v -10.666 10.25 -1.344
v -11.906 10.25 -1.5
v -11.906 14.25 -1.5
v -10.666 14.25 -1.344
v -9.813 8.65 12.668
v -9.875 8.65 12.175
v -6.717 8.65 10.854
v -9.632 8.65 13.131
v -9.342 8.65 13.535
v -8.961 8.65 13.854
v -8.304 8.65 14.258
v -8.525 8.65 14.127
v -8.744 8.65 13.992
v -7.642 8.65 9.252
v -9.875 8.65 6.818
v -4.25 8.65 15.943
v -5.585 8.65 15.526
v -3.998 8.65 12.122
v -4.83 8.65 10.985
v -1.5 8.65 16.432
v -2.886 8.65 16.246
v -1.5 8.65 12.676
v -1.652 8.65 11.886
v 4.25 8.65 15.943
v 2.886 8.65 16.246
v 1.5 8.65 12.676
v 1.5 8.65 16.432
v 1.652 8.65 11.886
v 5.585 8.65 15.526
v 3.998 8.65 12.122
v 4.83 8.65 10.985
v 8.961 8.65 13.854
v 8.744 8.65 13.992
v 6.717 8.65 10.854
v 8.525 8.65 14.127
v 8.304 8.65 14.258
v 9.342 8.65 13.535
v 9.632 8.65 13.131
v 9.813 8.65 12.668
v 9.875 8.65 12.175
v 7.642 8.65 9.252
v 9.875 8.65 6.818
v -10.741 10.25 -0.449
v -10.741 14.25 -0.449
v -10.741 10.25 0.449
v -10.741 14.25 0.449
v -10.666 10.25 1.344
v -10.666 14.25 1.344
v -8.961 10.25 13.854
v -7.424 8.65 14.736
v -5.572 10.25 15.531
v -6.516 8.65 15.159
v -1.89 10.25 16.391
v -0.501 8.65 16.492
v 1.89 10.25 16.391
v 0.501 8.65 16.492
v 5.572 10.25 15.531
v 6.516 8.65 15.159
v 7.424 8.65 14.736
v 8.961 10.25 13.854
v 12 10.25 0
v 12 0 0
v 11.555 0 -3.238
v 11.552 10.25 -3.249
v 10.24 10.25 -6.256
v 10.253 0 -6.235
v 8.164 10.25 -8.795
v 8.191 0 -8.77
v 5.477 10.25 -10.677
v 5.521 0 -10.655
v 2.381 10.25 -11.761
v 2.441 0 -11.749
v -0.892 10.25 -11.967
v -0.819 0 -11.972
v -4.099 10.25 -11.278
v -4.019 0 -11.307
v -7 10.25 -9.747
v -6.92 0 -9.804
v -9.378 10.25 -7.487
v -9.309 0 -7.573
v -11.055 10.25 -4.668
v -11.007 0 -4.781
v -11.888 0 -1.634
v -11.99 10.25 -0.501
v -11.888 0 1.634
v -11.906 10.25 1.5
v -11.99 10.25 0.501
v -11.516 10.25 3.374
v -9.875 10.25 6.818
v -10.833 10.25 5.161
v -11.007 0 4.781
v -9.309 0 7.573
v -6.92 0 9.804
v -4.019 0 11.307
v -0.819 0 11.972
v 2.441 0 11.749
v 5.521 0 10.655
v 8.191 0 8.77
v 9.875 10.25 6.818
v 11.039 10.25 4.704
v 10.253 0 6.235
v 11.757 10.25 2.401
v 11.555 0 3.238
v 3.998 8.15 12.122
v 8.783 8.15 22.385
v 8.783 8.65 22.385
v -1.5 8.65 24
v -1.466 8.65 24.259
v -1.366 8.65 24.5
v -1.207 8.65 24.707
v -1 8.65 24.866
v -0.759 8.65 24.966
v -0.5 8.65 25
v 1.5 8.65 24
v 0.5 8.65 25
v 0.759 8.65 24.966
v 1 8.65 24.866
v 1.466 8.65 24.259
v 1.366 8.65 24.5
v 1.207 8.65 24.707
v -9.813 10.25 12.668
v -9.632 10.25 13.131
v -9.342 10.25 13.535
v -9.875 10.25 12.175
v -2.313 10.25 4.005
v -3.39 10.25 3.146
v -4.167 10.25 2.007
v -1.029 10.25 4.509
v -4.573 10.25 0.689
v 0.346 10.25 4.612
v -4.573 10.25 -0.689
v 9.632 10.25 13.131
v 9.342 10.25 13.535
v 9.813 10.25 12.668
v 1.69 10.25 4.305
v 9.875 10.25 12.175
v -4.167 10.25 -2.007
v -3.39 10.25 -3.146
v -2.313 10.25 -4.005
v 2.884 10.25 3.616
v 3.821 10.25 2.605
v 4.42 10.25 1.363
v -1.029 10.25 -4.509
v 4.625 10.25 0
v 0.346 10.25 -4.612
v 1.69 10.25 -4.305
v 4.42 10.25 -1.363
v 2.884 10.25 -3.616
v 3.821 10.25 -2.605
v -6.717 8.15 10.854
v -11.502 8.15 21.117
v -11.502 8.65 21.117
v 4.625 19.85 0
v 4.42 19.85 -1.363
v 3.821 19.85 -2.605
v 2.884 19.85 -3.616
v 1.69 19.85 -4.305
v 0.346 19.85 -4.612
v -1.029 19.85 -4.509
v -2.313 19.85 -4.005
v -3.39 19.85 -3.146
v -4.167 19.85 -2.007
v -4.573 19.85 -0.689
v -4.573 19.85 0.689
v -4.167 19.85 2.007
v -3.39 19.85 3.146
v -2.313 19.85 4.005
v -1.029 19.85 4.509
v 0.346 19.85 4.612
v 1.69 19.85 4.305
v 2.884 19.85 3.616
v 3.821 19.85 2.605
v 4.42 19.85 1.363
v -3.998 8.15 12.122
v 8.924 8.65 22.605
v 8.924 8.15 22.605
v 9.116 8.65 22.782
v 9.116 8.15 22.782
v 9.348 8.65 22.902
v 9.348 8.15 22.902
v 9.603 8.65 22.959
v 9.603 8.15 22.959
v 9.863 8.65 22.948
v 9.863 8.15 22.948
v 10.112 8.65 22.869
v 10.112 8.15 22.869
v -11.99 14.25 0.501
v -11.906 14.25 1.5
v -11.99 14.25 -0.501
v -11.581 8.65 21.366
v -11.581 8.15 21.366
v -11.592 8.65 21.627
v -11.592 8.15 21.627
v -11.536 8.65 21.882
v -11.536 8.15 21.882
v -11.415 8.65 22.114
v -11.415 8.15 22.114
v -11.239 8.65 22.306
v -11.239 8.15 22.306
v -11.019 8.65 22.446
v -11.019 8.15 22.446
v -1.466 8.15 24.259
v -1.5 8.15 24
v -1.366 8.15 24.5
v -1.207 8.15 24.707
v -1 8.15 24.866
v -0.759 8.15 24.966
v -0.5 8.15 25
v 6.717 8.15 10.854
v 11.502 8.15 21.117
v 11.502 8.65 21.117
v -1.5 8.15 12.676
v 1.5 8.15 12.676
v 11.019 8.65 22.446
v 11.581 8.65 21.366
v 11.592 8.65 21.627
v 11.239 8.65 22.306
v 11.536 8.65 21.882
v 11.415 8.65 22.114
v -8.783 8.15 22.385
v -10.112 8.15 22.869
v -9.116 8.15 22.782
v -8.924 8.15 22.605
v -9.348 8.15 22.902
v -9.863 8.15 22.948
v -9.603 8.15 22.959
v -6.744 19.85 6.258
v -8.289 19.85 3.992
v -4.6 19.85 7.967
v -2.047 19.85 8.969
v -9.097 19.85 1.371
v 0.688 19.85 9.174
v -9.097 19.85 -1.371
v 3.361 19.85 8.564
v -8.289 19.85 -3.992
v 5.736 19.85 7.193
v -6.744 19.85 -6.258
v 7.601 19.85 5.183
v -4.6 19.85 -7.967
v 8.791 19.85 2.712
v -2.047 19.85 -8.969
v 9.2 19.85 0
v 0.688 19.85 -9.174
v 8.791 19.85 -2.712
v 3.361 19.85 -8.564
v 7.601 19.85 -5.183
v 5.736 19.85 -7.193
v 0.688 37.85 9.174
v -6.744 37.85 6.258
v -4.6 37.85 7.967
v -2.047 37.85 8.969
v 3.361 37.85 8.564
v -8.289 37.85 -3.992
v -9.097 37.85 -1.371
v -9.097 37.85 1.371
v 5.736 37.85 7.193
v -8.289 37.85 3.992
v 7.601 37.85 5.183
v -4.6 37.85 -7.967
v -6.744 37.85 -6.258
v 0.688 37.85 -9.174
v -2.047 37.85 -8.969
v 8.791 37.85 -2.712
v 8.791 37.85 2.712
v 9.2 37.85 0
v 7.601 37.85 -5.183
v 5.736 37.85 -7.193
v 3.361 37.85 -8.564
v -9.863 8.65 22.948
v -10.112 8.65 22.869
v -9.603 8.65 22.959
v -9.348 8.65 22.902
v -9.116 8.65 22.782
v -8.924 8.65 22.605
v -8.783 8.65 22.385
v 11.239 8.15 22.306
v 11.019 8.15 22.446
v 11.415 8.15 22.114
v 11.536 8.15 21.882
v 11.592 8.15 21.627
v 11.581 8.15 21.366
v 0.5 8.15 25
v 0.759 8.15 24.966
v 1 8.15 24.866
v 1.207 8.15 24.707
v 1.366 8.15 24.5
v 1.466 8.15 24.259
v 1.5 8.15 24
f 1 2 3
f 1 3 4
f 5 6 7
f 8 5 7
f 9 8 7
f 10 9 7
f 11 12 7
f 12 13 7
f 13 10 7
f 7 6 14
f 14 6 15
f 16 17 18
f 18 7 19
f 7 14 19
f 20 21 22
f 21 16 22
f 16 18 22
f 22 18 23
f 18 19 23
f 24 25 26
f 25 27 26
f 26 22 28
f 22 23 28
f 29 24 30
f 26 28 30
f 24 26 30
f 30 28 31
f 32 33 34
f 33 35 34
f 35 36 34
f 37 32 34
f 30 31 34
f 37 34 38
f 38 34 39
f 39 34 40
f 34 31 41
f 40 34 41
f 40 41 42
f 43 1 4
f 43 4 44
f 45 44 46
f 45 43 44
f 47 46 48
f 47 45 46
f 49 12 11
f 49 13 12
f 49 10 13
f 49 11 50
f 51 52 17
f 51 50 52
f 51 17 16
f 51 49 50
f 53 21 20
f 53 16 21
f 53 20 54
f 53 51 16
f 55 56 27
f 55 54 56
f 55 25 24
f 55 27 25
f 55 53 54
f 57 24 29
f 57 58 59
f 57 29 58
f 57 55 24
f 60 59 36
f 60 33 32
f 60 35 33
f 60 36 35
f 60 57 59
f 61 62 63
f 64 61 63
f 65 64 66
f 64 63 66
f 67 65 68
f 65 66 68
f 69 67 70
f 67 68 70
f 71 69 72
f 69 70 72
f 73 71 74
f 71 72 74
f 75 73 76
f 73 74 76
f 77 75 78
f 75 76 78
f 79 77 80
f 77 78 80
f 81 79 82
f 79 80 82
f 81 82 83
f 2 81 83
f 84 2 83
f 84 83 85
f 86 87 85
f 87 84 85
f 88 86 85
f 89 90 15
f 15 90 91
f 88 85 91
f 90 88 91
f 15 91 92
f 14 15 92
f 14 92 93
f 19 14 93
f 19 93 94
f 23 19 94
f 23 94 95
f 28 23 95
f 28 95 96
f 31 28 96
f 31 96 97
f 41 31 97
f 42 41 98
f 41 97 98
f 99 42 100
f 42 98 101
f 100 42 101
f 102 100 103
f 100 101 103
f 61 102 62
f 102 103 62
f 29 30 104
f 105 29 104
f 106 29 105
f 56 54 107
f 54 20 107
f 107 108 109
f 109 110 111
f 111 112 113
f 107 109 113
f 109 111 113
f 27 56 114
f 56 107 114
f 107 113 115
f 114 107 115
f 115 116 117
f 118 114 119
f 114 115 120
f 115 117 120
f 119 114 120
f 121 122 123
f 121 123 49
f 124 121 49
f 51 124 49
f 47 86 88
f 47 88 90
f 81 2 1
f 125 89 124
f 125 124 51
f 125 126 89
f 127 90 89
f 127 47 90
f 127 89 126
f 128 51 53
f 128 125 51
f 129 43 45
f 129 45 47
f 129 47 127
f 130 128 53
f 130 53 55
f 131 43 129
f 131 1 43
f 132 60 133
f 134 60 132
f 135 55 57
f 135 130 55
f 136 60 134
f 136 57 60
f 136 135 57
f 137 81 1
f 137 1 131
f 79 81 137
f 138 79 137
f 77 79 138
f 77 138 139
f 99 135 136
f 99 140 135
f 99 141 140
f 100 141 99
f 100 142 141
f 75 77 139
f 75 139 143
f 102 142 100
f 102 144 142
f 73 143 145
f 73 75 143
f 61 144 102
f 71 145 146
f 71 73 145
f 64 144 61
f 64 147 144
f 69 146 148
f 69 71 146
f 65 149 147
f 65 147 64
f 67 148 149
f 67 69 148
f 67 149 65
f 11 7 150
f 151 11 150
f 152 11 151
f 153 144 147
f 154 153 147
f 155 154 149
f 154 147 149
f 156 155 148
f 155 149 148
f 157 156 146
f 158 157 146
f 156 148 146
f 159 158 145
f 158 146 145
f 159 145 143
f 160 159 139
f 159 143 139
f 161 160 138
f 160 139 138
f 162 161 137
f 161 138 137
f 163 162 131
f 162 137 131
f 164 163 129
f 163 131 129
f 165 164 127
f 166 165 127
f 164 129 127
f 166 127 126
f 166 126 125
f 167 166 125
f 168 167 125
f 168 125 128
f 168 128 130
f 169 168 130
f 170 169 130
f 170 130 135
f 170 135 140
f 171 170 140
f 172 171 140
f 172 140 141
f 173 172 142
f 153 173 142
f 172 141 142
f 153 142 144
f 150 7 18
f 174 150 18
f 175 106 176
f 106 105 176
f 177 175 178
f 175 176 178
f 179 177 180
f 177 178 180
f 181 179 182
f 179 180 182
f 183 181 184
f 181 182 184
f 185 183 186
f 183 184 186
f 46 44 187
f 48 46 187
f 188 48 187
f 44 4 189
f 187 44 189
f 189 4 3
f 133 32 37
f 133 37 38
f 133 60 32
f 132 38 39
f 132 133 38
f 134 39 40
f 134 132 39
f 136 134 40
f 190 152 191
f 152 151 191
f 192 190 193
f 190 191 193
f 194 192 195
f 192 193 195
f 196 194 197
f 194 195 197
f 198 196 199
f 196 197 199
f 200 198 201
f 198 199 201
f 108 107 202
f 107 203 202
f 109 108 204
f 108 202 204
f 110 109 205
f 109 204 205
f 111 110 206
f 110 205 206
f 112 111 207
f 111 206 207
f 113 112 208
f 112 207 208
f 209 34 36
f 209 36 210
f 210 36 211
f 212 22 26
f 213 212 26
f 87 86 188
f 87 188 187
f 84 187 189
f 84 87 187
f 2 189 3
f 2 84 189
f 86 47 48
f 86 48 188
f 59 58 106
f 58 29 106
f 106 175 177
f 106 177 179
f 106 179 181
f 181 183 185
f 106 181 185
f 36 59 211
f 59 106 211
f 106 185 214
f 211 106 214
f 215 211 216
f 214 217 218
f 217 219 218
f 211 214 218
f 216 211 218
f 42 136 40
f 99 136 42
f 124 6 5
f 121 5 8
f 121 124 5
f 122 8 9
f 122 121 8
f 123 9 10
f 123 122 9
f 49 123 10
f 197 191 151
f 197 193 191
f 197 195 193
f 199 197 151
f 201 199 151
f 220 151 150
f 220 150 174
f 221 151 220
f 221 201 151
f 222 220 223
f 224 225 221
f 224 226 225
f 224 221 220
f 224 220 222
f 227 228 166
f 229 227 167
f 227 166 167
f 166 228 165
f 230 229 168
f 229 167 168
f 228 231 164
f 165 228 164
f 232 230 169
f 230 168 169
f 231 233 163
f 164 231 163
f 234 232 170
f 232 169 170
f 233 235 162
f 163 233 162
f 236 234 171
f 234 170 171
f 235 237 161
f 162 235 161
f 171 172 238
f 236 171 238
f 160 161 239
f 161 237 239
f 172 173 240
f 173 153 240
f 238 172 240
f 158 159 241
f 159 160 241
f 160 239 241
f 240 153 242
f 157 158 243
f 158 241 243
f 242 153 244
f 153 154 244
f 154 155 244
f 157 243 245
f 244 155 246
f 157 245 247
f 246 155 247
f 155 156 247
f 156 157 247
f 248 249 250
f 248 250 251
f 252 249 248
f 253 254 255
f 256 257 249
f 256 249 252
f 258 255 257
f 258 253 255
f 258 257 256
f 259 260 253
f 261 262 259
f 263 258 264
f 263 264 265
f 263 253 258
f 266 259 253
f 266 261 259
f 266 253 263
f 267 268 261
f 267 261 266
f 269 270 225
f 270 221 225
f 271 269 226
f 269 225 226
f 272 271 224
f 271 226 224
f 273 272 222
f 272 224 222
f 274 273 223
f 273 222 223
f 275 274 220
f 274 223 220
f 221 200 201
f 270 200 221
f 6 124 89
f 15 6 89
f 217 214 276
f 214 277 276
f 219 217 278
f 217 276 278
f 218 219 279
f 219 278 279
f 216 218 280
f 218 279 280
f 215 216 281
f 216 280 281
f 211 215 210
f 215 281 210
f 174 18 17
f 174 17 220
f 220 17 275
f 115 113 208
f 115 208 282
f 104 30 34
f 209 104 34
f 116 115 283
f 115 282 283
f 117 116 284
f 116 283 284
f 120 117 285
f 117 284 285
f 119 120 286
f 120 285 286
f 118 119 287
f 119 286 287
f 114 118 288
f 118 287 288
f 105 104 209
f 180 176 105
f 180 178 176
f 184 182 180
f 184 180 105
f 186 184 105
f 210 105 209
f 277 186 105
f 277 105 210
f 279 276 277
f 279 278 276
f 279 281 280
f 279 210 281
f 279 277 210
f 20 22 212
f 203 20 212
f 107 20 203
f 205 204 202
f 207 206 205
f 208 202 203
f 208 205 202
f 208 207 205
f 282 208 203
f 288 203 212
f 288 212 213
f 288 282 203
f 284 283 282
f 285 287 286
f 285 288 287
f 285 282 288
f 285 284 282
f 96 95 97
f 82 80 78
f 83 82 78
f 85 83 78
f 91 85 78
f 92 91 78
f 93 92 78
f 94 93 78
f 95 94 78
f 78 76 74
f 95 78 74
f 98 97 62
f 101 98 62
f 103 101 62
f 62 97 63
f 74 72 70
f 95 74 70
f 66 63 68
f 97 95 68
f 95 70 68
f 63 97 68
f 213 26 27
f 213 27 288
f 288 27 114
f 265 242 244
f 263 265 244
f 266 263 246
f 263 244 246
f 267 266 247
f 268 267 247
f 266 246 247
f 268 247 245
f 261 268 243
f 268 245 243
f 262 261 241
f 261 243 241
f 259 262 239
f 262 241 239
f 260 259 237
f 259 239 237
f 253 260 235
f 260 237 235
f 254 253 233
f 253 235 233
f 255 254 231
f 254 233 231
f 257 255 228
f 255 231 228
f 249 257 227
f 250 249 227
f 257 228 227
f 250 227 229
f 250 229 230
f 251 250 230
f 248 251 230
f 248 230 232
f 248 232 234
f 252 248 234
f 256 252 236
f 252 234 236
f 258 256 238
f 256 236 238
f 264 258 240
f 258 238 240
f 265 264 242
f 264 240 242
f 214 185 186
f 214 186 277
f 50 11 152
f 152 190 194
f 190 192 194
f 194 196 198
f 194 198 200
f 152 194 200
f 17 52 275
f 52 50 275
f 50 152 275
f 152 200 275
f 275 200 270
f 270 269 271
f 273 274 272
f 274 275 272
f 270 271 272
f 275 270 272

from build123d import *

# Parameters (mm, degrees)
SKETCH1_R                = 12
BOSS_EXTRUDE1_DEPTH      = 10.25
SKETCH4_W                = 19.75
SKETCH4_H                = 16.5
BOSS_EXTRUDE4_DEPTH      = 1.6
SKETCH5_OUTSIDE_W        = 33.728
SKETCH5_OUTSIDE_H        = 38.228
SKETCH5_OUTSIDE_R        = 16.5
CUT_EXTRUDE1_DEPTH       = 1.6
FILLET2_R                = 2
SKETCH6_W                = 3
SKETCH6_H                = 12.32415633
BOSS_EXTRUDE6_DEPTH      = 0.5
FILLET3_R                = 1
CIRPATTERN1_COUNT        = 2
CIRPATTERN1_ANGLE        = 25
FILLET3_OF_CIRPATTERN1_R = 1
CIRPATTERN2_COUNT        = 2
CIRPATTERN2_ANGLE        = 25
FILLET3_OF_CIRPATTERN2_R = 1
SKETCH2_R                = 4.625
BOSS_EXTRUDE2_DEPTH      = 9.6
SKETCH3_R                = 9.2
BOSS_EXTRUDE3_DEPTH      = 18
BOSS_EXTRUDE7_DEPTH      = 4


with BuildPart() as part:
    # Sketch1 → Boss-Extrude1 (new body)
    with BuildSketch(Plane(origin=(0, 0, 0), x_dir=(1, 0, 0), z_dir=(0, 1, 0))):
        Circle(SKETCH1_R)
    extrude(amount=BOSS_EXTRUDE1_DEPTH)

    # Sketch4 → Boss-Extrude4 (add)
    with BuildSketch(Plane(origin=(0, 10.25, 0), x_dir=(1, 0, 0), z_dir=(0, 1, 0))):
        with Locations((0, -8.25)):
            Rectangle(SKETCH4_W, SKETCH4_H)
    extrude(amount=-BOSS_EXTRUDE4_DEPTH)

    # Sketch5 outside → Cut-Extrude1 (cut)
    with BuildSketch(Plane(origin=(0, 10.25, 0), x_dir=(1, 0, 0), z_dir=(0, 1, 0))):
        with Locations((0, -2.25)):
            Rectangle(SKETCH5_OUTSIDE_W, SKETCH5_OUTSIDE_H)
        Circle(SKETCH5_OUTSIDE_R, mode=Mode.SUBTRACT)
    extrude(amount=-CUT_EXTRUDE1_DEPTH, mode=Mode.SUBTRACT)

    # Fillet2
    fillet2_edges = [part.edges().sort_by_distance(p)[0] for p in [
        (-9.875, 9.45, 13.218713061),
        (9.875, 9.45, 13.218713061),
    ]]
    fillet(fillet2_edges, radius=FILLET2_R)

    # Sketch6 → Boss-Extrude6 (add)
    with BuildSketch(Plane.XZ.offset(-8.65)):
        with Locations((0, 18.837921835)):
            Rectangle(SKETCH6_W, SKETCH6_H)
    boss_extrude6 = extrude(amount=BOSS_EXTRUDE6_DEPTH)

    # Fillet3
    fillet3_edges = [part.edges().sort_by_distance(p)[0] for p in [
        (-1.5, 8.4, 25),
        (1.5, 8.4, 25),
    ]]
    fillet(fillet3_edges, radius=FILLET3_R)

    # CirPattern1: Boss-Extrude6 ×2 about axis
    cirpattern1_axis = Axis((0, 0, 0), (0, 1, 0))
    for i in range(1, CIRPATTERN1_COUNT):
        add(boss_extrude6.rotate(cirpattern1_axis, i * CIRPATTERN1_ANGLE / (CIRPATTERN1_COUNT - 1)))

    # Fillet3 of CirPattern1
    fillet3_of_cirpattern1_edges = [part.edges().sort_by_distance(p)[0] for p in [
        (9.205994863, 8.4, 23.291622069),
        (11.924918224, 8.4, 22.023767283),
    ]]
    fillet(fillet3_of_cirpattern1_edges, radius=FILLET3_OF_CIRPATTERN1_R)

    # CirPattern2: Boss-Extrude6 ×2 about axis
    cirpattern2_axis = Axis((0, 0, 0), (0, -1, 0))
    for i in range(1, CIRPATTERN2_COUNT):
        add(boss_extrude6.rotate(cirpattern2_axis, i * CIRPATTERN2_ANGLE / (CIRPATTERN2_COUNT - 1)))

    # Fillet3 of CirPattern2
    fillet3_of_cirpattern2_edges = [part.edges().sort_by_distance(p)[0] for p in [
        (-11.924918224, 8.4, 22.023767283),
        (-9.205994863, 8.4, 23.291622069),
    ]]
    fillet(fillet3_of_cirpattern2_edges, radius=FILLET3_OF_CIRPATTERN2_R)

    # Sketch2 → Boss-Extrude2 (add)
    with BuildSketch(Plane(origin=(0, 10.25, 0), x_dir=(1, 0, 0), z_dir=(0, 1, 0))):
        Circle(SKETCH2_R)
    extrude(amount=BOSS_EXTRUDE2_DEPTH)

    # Sketch3 → Boss-Extrude3 (add)
    with BuildSketch(Plane(origin=(0, 19.85, 0), x_dir=(1, 0, 0), z_dir=(0, 1, 0))):
        Circle(SKETCH3_R)
    extrude(amount=BOSS_EXTRUDE3_DEPTH)

    # Sketch7 → Boss-Extrude7 (add)
    with BuildSketch(Plane(origin=(0, 10.25, 0), x_dir=(1, 0, 0), z_dir=(0, 1, 0))):
        with BuildLine():
            Line((-11.9058809, 1.5), (-10.665684973, 1.34375))
            ThreePointArc((-10.665684973, 1.34375), (-10.75, 0), (-10.665684973, -1.34375))
            Line((-10.665684973, -1.34375), (-11.9058809, -1.5))
            ThreePointArc((-11.9058809, -1.5), (-12, 0), (-11.9058809, 1.5))
        make_face()
    extrude(amount=BOSS_EXTRUDE7_DEPTH)


solid = part.part
